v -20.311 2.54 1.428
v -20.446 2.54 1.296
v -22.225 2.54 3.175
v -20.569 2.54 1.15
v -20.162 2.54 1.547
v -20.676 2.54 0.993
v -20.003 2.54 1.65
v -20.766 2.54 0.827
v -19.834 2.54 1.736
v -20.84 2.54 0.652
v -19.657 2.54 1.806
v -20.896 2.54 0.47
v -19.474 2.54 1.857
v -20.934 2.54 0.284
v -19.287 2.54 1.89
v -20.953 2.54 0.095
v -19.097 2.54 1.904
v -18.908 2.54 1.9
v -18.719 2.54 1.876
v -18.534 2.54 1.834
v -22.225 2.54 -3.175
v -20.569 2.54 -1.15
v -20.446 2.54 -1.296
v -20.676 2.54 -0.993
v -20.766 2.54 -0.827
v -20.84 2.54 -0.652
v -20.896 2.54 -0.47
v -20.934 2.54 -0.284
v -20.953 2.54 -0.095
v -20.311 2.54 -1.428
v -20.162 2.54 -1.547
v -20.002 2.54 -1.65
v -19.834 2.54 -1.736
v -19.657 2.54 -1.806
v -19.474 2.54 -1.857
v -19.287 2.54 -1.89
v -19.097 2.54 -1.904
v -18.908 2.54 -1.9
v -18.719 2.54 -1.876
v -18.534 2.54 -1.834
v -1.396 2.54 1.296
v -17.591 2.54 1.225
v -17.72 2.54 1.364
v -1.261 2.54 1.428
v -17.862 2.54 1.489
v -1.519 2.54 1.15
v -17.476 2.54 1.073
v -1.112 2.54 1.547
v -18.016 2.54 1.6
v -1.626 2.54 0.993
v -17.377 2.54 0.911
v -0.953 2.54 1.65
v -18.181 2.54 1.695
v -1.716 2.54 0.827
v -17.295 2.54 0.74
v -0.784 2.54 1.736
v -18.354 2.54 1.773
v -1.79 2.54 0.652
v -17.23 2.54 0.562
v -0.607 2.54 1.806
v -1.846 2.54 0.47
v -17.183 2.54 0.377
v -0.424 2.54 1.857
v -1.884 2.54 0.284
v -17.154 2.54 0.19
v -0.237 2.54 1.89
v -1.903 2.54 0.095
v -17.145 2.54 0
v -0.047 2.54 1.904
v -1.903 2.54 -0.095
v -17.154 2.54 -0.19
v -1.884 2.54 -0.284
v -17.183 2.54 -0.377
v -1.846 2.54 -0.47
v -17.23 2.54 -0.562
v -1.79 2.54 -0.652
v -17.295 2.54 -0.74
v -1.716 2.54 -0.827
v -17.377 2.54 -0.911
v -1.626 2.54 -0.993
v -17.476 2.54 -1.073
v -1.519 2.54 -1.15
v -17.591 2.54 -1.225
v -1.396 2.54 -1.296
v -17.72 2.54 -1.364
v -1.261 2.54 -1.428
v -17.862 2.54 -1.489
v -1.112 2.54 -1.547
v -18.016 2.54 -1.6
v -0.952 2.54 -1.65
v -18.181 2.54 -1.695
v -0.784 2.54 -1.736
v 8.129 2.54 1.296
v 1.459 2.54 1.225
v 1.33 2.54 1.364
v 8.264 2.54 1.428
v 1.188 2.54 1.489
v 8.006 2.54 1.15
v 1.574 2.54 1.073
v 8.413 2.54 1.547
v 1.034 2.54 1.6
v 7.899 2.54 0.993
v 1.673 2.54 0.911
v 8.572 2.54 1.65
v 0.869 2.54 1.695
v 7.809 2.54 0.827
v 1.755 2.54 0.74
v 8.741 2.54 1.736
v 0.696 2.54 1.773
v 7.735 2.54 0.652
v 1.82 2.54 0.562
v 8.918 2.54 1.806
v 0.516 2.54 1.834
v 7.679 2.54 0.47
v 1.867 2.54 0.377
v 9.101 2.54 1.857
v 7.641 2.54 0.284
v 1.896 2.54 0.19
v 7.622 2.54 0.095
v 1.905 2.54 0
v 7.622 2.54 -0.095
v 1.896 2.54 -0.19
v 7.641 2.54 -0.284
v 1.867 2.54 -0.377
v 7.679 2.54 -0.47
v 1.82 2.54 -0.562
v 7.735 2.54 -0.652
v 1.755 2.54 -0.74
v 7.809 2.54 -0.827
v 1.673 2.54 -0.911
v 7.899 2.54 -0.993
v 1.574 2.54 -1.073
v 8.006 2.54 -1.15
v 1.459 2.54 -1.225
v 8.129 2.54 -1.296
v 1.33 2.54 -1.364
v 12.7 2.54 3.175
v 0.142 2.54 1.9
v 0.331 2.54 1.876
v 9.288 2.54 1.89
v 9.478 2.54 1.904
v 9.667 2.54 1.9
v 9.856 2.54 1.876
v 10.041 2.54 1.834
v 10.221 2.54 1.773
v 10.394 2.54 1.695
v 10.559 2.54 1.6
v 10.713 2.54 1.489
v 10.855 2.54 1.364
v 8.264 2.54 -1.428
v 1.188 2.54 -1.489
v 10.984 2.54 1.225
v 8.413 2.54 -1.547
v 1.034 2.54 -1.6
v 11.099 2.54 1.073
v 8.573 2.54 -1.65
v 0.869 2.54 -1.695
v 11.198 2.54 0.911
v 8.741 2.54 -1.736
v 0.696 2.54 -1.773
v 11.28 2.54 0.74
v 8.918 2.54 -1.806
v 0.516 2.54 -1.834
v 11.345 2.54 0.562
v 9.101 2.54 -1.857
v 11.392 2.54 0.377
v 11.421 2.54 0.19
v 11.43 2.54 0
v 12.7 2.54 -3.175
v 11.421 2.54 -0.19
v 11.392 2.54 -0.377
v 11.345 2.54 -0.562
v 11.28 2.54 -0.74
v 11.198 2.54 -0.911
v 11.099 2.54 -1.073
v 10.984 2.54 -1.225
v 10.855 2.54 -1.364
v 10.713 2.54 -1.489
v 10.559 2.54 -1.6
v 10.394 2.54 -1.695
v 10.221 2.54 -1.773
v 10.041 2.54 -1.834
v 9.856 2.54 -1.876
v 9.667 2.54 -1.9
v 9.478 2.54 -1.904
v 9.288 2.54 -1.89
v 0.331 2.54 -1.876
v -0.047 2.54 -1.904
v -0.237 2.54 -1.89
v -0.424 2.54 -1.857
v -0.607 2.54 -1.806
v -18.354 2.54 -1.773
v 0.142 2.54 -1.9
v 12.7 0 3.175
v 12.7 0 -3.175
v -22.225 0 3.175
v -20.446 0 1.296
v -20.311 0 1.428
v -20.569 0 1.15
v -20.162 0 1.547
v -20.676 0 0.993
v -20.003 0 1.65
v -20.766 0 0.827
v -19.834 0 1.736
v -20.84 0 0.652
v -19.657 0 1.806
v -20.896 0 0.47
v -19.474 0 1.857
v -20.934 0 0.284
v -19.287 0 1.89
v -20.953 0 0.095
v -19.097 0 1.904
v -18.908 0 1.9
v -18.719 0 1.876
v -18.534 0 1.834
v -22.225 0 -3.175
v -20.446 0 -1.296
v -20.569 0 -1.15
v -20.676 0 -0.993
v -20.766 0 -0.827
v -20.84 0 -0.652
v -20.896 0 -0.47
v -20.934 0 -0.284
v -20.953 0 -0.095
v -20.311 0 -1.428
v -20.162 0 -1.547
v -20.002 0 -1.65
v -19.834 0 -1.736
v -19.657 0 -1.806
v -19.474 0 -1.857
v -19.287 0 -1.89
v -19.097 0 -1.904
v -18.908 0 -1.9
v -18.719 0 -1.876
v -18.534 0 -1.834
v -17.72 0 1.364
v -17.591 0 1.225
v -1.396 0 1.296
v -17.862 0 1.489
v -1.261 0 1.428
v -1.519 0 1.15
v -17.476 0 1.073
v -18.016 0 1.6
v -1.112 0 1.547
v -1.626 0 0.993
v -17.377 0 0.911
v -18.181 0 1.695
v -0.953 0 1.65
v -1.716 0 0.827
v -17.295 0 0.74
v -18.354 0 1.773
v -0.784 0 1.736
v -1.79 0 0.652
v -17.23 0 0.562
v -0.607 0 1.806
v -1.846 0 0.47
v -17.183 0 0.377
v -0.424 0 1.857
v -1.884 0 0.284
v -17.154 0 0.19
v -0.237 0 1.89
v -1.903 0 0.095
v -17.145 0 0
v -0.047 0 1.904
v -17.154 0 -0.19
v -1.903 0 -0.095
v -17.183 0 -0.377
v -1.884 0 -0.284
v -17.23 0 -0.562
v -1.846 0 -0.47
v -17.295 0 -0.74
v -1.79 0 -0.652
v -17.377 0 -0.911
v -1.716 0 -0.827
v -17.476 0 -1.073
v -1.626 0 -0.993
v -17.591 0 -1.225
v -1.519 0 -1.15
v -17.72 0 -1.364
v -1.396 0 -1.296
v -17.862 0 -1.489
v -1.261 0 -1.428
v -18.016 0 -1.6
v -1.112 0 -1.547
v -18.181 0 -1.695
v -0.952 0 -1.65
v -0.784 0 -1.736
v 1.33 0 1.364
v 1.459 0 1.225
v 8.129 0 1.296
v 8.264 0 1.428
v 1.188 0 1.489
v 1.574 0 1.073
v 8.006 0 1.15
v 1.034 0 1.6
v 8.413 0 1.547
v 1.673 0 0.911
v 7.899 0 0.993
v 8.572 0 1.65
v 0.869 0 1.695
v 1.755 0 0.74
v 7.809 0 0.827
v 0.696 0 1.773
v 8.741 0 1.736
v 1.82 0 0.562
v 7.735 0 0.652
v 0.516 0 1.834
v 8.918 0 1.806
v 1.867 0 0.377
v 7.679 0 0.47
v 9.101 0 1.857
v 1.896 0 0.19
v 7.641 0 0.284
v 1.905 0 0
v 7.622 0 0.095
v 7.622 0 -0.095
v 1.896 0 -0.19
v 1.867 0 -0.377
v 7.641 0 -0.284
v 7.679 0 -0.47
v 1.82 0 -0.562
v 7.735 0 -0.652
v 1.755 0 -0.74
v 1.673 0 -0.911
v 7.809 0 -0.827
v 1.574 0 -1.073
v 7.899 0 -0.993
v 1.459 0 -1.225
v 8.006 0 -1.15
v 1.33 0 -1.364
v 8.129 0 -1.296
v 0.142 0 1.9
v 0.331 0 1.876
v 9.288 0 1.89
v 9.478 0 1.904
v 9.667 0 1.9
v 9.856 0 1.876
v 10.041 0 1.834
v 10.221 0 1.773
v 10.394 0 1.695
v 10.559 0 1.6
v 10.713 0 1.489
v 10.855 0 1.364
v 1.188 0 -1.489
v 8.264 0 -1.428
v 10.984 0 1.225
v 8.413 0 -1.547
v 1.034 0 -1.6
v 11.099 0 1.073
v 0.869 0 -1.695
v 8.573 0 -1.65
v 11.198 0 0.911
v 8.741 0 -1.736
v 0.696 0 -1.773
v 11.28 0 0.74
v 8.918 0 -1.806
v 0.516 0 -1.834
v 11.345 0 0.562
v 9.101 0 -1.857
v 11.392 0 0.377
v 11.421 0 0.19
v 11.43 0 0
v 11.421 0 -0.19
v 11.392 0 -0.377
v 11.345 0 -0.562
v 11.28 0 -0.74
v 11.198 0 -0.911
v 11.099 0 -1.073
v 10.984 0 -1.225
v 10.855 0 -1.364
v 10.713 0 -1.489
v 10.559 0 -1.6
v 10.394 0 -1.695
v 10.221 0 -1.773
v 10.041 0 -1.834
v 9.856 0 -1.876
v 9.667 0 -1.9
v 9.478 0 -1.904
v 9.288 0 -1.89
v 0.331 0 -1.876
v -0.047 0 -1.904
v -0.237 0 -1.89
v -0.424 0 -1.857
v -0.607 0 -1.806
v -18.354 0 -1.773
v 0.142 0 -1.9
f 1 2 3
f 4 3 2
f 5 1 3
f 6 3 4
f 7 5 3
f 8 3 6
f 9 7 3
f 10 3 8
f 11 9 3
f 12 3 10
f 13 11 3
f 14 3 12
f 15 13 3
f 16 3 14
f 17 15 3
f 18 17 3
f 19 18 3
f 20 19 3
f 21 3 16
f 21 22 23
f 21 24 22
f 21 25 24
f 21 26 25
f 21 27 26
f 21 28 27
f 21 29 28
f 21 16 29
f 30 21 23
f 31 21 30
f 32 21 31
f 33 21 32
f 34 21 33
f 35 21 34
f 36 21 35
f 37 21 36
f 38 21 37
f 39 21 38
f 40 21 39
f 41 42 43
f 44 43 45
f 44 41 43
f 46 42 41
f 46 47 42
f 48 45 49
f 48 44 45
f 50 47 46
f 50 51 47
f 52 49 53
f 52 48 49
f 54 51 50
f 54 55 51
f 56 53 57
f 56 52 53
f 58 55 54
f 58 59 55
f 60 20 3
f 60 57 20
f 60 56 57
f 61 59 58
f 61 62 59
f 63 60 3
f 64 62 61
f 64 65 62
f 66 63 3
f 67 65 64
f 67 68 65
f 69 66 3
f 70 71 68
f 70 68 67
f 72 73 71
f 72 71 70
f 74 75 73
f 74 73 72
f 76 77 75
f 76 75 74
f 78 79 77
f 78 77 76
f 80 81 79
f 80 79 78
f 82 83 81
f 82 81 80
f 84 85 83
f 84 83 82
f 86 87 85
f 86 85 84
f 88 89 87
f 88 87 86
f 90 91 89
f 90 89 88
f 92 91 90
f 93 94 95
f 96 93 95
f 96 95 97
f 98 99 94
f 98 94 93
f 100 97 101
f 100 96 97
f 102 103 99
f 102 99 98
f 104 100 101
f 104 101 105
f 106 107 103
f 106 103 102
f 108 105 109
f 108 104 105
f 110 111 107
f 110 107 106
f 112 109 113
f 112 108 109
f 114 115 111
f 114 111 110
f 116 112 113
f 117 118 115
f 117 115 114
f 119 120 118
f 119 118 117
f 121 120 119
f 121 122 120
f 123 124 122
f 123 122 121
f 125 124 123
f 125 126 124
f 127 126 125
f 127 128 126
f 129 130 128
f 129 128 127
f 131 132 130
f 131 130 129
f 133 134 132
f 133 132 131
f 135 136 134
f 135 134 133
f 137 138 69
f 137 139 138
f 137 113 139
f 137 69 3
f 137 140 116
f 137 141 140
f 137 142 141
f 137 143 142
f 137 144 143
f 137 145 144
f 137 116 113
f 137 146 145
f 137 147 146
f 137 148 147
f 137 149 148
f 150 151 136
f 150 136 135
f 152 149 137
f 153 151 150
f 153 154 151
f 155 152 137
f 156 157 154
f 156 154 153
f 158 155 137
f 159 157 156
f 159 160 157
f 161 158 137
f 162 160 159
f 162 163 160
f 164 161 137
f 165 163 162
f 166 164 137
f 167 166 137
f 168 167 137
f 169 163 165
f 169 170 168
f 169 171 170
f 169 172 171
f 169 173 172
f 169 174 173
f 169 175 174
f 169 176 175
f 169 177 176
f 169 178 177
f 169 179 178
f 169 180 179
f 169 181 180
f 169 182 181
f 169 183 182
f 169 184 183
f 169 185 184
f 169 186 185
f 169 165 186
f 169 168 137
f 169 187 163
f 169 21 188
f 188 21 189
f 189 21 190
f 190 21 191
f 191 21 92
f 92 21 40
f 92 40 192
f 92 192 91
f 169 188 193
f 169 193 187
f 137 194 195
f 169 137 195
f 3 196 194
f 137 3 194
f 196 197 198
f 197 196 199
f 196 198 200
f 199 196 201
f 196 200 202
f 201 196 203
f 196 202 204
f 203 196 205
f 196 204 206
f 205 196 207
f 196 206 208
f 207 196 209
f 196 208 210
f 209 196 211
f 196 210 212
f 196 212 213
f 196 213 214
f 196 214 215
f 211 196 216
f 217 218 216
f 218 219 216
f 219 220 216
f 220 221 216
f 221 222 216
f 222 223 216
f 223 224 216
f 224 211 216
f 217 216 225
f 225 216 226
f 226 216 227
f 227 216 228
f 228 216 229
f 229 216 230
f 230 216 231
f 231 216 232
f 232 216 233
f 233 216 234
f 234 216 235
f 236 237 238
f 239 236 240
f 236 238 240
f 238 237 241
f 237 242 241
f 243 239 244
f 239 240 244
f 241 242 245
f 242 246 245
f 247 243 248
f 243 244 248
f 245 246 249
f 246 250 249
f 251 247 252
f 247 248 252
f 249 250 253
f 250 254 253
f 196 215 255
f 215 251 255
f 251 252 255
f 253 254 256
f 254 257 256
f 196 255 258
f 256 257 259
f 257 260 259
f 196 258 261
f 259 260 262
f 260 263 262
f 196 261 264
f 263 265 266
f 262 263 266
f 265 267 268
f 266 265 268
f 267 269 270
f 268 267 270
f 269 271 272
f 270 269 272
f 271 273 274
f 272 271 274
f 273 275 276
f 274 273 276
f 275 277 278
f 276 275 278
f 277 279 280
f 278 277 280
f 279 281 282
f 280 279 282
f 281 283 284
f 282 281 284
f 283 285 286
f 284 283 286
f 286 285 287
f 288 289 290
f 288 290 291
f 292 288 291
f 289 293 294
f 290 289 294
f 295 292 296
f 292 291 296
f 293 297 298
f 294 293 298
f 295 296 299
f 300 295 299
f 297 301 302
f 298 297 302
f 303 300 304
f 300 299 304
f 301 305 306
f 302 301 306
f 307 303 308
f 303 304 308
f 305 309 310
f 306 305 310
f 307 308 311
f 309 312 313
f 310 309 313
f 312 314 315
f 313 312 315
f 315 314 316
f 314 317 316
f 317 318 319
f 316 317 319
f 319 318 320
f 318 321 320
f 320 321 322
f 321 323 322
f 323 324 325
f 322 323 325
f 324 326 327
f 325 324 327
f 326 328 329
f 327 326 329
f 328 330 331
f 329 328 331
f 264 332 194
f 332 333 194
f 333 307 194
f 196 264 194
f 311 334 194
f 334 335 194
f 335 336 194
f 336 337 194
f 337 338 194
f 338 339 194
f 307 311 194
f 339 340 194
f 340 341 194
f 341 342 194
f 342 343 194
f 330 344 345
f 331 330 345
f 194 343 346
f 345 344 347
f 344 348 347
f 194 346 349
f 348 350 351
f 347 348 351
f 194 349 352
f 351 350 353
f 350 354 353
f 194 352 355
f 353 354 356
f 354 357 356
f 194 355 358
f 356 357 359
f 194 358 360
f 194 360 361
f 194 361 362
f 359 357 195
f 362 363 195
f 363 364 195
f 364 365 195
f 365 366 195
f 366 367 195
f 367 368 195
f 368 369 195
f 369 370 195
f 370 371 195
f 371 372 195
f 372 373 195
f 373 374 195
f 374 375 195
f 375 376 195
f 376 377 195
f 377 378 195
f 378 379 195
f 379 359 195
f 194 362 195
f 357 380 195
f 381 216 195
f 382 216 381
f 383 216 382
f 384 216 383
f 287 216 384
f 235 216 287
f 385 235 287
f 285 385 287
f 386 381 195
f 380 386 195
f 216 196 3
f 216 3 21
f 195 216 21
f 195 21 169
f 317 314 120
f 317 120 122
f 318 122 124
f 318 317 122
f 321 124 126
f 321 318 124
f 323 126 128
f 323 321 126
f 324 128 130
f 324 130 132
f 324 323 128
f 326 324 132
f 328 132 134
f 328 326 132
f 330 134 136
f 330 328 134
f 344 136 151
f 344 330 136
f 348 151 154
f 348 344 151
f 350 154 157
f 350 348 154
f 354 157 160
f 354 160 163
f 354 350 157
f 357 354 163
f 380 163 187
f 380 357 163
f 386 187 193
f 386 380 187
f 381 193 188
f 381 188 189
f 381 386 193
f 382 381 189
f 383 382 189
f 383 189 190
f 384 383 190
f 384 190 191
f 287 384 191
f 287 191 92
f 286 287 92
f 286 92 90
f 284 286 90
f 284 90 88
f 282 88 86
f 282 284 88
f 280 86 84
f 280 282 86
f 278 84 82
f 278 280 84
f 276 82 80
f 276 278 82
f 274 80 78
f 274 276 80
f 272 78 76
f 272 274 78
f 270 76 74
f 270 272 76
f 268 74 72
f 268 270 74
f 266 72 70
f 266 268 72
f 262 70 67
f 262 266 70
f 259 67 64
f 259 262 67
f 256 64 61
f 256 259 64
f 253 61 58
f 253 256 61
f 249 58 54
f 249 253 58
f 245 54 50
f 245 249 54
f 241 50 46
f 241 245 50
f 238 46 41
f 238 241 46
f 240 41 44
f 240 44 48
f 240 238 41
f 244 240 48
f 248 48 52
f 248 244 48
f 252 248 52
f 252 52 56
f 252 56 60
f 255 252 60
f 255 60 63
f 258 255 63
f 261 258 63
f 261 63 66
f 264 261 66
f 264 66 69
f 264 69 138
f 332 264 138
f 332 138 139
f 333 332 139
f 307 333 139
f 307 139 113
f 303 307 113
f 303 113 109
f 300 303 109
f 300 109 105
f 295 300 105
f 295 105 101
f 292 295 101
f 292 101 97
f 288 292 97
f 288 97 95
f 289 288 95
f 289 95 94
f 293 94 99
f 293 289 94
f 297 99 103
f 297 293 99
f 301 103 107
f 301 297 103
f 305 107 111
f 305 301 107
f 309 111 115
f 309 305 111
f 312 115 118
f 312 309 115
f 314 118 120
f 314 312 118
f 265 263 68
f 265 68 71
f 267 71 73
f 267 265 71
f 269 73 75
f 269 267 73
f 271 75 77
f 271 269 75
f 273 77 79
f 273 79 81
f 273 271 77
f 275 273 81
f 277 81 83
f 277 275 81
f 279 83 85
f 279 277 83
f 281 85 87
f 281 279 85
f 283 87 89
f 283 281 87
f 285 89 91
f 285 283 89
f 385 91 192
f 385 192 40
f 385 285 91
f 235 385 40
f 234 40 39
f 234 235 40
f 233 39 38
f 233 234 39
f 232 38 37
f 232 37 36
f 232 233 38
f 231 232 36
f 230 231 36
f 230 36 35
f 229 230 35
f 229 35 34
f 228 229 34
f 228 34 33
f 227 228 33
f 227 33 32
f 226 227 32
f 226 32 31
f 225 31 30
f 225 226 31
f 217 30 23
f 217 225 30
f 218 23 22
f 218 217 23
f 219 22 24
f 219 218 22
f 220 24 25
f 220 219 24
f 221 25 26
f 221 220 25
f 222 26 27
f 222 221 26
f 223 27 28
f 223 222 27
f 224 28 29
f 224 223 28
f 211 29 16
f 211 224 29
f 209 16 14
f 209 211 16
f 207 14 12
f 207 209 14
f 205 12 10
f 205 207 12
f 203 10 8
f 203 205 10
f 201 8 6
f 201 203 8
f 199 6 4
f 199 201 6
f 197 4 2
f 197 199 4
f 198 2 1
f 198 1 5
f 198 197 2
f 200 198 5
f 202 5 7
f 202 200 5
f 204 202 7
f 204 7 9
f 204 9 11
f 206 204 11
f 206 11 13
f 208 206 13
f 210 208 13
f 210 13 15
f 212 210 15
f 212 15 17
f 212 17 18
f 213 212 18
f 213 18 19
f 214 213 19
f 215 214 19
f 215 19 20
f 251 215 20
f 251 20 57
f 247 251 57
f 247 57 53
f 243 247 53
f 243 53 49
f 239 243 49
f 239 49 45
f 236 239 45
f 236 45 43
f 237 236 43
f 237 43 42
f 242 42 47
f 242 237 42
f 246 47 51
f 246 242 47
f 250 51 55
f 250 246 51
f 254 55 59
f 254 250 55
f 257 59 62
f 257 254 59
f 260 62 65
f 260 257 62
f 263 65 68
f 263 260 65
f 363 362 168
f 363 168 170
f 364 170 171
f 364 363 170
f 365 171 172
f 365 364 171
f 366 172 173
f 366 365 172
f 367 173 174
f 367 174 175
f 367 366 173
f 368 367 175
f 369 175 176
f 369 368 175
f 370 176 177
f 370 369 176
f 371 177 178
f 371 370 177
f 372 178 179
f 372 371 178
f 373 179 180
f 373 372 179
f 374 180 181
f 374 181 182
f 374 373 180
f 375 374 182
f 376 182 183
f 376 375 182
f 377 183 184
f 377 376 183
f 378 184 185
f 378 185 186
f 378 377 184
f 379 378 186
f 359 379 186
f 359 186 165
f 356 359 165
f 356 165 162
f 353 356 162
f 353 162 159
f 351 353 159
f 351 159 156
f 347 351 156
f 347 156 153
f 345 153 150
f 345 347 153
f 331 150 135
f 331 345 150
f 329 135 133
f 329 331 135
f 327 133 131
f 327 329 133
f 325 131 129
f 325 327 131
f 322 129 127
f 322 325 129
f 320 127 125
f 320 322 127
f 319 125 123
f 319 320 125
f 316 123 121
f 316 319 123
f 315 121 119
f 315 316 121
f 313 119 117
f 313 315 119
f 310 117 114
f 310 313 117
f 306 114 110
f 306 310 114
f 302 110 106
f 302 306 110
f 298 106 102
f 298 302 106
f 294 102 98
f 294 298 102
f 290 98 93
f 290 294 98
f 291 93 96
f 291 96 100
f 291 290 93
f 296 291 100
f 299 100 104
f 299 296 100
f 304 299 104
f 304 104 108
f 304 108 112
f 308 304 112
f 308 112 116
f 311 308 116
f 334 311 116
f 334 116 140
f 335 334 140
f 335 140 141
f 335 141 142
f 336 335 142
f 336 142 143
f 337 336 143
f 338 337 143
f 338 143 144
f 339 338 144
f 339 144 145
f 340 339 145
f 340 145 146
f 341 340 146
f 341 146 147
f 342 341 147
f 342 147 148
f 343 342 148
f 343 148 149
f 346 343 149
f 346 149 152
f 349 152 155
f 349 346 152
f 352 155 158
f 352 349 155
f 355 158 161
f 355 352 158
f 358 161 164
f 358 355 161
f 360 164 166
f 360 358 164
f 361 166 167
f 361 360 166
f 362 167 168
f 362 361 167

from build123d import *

# Parameters (mm, degrees)
SKETCH1_W           = 34.925
SKETCH1_H           = 6.35
SKETCH1_R           = 1.905
BOSS_EXTRUDE1_DEPTH = 2.54


with BuildPart() as part:
    # Sketch1 → Boss-Extrude1 (new body)
    with BuildSketch(Plane(origin=(0, 0, 0), x_dir=(1, 0, 0), z_dir=(0, 1, 0))):
        with Locations((-4.7625, 0)):
            Rectangle(SKETCH1_W, SKETCH1_H)
        with Locations((-19.05, 0)):
            Circle(SKETCH1_R, mode=Mode.SUBTRACT)
        with Locations((9.525, 0)):
            Circle(SKETCH1_R, mode=Mode.SUBTRACT)
        Circle(SKETCH1_R, mode=Mode.SUBTRACT)
    extrude(amount=BOSS_EXTRUDE1_DEPTH)


solid = part.part
